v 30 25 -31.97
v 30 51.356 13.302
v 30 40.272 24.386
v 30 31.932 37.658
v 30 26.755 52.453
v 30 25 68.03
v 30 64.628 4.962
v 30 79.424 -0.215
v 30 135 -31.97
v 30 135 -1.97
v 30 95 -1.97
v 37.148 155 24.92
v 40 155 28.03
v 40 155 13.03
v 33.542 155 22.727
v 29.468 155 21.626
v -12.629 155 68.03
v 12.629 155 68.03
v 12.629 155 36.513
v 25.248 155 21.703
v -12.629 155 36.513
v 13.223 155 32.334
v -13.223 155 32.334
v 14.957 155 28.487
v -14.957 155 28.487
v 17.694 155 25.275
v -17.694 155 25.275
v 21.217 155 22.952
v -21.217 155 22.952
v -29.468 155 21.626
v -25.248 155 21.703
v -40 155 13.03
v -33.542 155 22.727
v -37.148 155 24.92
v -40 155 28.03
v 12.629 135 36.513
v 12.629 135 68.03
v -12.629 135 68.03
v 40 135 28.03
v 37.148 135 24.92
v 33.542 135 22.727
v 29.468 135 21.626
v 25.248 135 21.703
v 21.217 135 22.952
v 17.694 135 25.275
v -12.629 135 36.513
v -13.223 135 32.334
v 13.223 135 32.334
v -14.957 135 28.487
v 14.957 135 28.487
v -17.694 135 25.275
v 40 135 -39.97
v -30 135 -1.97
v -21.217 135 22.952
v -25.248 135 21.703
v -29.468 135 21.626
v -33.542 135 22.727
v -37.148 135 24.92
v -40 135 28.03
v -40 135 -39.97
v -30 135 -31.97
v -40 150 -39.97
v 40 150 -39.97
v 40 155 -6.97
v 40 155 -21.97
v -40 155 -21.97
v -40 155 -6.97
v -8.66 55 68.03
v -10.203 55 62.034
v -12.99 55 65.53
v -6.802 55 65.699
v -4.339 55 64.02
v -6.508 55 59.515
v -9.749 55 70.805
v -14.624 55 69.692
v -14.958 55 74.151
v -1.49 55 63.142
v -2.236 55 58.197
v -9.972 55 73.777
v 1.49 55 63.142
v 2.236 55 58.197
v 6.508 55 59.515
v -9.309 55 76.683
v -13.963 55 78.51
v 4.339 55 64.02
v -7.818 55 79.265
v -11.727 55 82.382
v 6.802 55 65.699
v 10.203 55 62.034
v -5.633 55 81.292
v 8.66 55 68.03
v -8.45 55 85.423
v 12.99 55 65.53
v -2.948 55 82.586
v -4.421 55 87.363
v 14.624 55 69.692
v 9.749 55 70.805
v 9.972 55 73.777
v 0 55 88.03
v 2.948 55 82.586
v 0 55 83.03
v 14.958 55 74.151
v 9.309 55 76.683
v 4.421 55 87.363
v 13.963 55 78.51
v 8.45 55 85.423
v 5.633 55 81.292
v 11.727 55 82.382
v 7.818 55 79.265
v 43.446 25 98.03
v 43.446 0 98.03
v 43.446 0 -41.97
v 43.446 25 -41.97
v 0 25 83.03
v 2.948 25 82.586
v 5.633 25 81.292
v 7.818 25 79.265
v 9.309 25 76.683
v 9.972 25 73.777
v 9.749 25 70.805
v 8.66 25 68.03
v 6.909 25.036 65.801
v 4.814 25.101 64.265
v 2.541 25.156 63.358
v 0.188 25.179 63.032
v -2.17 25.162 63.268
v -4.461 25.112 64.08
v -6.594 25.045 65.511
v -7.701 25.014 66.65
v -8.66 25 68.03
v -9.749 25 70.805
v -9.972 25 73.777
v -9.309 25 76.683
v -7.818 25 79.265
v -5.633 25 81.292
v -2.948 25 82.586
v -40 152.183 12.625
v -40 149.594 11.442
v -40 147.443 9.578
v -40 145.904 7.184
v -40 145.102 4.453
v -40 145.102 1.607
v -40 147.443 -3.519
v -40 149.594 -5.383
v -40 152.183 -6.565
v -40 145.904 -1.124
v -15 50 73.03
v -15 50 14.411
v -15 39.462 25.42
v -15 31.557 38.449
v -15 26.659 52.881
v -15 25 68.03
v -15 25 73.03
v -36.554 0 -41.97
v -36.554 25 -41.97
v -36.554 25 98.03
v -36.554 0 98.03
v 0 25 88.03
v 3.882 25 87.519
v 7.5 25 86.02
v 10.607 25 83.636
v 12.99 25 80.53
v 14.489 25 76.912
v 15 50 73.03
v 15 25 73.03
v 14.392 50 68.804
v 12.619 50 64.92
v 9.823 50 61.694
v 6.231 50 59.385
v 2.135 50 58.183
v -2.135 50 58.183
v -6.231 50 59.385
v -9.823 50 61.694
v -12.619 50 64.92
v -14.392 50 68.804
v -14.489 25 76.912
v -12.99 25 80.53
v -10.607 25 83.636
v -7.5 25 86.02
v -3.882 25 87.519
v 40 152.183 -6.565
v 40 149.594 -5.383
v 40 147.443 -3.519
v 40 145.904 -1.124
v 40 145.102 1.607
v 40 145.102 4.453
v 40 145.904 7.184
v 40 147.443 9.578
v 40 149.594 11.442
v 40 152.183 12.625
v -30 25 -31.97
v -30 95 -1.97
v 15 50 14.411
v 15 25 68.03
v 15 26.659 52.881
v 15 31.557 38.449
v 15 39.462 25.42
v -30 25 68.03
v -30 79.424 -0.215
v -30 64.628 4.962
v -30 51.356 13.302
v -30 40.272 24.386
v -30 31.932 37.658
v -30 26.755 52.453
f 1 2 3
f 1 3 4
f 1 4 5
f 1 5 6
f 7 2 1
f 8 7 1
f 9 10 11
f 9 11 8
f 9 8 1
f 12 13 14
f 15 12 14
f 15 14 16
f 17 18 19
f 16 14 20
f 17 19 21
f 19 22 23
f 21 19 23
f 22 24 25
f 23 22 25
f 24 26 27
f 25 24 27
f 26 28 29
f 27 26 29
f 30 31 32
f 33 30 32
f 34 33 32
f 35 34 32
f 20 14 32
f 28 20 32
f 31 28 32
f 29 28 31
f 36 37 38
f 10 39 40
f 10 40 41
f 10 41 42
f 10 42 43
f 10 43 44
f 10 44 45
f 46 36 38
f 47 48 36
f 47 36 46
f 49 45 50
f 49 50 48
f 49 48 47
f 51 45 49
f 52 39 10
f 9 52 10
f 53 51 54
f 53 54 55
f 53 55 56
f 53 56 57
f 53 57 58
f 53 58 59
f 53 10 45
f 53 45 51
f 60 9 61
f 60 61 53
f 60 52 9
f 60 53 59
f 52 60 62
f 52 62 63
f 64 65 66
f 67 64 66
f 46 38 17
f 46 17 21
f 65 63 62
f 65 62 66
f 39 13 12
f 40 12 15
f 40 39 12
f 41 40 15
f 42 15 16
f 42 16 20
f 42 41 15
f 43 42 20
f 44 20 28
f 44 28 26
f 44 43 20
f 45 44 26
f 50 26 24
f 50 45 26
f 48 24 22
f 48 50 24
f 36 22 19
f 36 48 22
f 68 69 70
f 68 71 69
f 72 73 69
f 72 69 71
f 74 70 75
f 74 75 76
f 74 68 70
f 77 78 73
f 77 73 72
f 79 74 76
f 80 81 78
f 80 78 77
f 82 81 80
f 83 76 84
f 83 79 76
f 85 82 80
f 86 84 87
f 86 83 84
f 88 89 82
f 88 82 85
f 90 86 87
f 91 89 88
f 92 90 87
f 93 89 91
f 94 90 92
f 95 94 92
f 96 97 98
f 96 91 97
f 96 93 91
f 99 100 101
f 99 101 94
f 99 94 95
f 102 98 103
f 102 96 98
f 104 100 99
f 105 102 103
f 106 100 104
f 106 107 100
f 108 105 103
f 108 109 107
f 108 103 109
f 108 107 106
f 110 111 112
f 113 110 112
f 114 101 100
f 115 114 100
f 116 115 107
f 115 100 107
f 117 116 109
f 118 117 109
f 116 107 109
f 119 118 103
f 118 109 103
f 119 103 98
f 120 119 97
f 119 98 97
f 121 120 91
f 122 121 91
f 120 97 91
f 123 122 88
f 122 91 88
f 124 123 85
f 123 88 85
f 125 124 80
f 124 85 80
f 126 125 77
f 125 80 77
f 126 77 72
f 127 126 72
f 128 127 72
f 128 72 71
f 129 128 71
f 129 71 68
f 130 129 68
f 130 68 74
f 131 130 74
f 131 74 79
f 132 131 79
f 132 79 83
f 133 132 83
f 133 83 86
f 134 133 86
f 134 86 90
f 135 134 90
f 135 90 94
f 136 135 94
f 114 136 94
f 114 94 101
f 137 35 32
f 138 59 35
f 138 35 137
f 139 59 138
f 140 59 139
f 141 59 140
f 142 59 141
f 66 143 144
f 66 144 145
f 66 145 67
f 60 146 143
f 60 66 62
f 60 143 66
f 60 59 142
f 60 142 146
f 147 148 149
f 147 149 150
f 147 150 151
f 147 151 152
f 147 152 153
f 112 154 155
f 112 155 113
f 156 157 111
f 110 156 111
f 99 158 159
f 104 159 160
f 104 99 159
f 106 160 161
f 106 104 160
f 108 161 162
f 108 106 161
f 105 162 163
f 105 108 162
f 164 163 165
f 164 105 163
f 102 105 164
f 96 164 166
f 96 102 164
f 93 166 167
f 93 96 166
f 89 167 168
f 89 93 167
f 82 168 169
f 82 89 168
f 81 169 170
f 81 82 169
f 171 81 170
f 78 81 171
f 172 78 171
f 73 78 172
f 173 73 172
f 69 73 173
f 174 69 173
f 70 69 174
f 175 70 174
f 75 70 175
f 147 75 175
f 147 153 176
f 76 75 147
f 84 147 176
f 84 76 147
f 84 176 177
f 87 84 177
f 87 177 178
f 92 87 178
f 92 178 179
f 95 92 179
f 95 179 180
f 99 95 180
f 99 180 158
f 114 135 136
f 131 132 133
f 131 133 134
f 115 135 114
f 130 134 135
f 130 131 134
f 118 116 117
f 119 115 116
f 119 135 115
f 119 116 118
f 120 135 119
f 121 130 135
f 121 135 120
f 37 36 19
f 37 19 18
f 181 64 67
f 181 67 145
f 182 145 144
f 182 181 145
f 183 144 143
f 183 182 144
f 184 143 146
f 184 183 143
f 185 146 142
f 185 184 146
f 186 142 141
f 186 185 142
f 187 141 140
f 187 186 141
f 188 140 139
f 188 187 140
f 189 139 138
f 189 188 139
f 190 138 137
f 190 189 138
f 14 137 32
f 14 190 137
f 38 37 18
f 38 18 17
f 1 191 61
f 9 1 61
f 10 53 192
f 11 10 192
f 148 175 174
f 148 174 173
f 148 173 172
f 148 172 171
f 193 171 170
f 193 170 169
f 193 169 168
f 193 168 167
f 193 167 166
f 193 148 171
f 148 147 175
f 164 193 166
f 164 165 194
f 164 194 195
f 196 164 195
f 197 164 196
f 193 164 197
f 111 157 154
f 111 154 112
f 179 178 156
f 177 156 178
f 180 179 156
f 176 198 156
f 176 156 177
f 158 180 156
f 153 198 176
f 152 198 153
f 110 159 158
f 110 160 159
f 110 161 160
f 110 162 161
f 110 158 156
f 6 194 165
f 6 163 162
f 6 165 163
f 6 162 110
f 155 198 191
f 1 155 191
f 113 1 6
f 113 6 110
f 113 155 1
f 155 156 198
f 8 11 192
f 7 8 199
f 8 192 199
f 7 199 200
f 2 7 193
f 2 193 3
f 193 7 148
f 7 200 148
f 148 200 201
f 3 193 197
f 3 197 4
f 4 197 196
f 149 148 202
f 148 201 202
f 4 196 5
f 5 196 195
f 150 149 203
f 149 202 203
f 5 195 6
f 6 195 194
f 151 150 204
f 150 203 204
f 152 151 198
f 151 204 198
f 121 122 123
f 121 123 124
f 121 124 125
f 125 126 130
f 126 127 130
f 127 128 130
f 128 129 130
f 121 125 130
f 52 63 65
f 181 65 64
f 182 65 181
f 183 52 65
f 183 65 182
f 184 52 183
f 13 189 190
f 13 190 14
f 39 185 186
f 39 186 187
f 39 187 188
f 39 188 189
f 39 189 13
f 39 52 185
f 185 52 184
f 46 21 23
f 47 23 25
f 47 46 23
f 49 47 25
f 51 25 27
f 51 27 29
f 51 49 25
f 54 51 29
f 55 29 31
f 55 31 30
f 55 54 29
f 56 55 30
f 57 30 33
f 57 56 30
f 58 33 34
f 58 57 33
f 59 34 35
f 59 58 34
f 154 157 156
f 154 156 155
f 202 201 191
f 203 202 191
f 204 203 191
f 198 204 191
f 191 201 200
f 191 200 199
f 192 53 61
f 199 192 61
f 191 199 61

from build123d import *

# Parameters (mm, degrees)
SKETCH1_W                = 80
SKETCH1_H                = 140
BOSS_EXTRUDE1_DEPTH      = 25
BOSS_EXTRUDE2_DEPTH      = 30
BOSS_EXTRUDE2_DEPTH_BACK = 30
BOSS_EXTRUDE3_REACH      = 135.781
SKETCH3_R                = 15
SKETCH3_R_2              = 10
BOSS_EXTRUDE7_DEPTH      = 30
BOSS_EXTRUDE8_DEPTH      = 20
CUT_EXTRUDE1_REACH       = 202.087


with BuildPart() as part:
    # Sketch1 → Boss-Extrude1 (new body)
    with BuildSketch(Plane(origin=(0, 0, 0), x_dir=(1, 0, 0), z_dir=(0, 1, 0))):
        with Locations((3.446067736, -28.029835879)):
            Rectangle(SKETCH1_W, SKETCH1_H)
    extrude(amount=BOSS_EXTRUDE1_DEPTH)

    # Sketch2 → Boss-Extrude2 (add, two sides: drawn at the far end of the back side and taken through both)
    with BuildSketch(Plane(origin=(0, 0, 0), x_dir=(0, 0, -1), z_dir=(1, 0, 0)).offset(-BOSS_EXTRUDE2_DEPTH_BACK)):
        with BuildLine():
            Line((31.970164121, 25), (31.970164121, 135))
            Line((31.970164121, 135), (1.970164121, 135))
            Line((1.970164121, 135), (1.970164121, 95))
            ThreePointArc((1.970164121, 95), (-18.532361196, 45.502525317), (-68.029835879, 25))
            Line((-68.029835879, 25), (31.970164121, 25))
        make_face()
    extrude(amount=BOSS_EXTRUDE2_DEPTH + BOSS_EXTRUDE2_DEPTH_BACK)

    # Sketch3 → Boss-Extrude3 (add, up to next)
    with BuildSketch(Plane(origin=(0, 55, 0), x_dir=(1, 0, 0), z_dir=(0, 1, 0)), mode=Mode.PRIVATE) as boss_extrude3_sk1:
        with Locations(Location((0, -73.029835879, 0), (0, 0, 270))):
            Circle(SKETCH3_R)
        with Locations(Location((0, -73.029835879, 0), (0, 0, 270))):
            Circle(SKETCH3_R_2, mode=Mode.SUBTRACT)
    boss_extrude3_tool1 = extrude(boss_extrude3_sk1.sketch, amount=-BOSS_EXTRUDE3_REACH, mode=Mode.PRIVATE) - part.part
    add(boss_extrude3_tool1.solids().sort_by_distance((0, 55, 58.4541))[0])

    # Sketch4 → Boss-Extrude7 (add)
    with BuildSketch(Plane(origin=(0, 50, 0), x_dir=(1, 0, 0), z_dir=(0, 1, 0))):
        with BuildLine():
            ThreePointArc((-15, -73.029835859), (6e-09, -58.029835879), (15, -73.029835871))
            Line((15, -73.029835871), (15, -7.547322413))
            Line((15, -7.547322413), (-15, -7.547322413))
            Line((-15, -7.547322413), (-15, -73.029835859))
        make_face()
    extrude(amount=-BOSS_EXTRUDE7_DEPTH)

    # Sketch7 → Boss-Extrude8 (add)
    with BuildSketch(Plane(origin=(0, 135, 0), x_dir=(1, 0, 0), z_dir=(0, 1, 0))):
        with BuildLine():
            Line((12.629019998, -36.512692343), (12.629019998, -68.029835879))
            Line((12.629019998, -68.029835879), (-12.629019998, -68.029835879))
            Line((-12.629019998, -68.029835879), (-12.629019998, -36.512692343))
            ThreePointArc((-12.629019998, -36.512692343), (-23.188563942, -22.185014582), (-40, -28.029835879))
            Line((-40, -28.029835879), (-40, 39.970164121))
            Line((-40, 39.970164121), (40, 39.970164121))
            Line((40, 39.970164121), (40, -28.029835879))
            ThreePointArc((40, -28.029835879), (23.188563942, -22.185014582), (12.629019998, -36.512692343))
        make_face()
    extrude(amount=BOSS_EXTRUDE8_DEPTH)

    # Sketch8 → Cut-Extrude1 (cut, up to next)
    with BuildSketch(Plane(origin=(40, 0, 0), x_dir=(0, 0, -1), z_dir=(1, 0, 0)), mode=Mode.PRIVATE) as cut_extrude1_sk1:
        Polygon((21.970164121, 155), (39.970164121, 155), (39.970164121, 150), align=None)
    cut_extrude1_tool1 = extrude(cut_extrude1_sk1.sketch, amount=-CUT_EXTRUDE1_REACH, mode=Mode.PRIVATE) & part.part
    # Sketch8 → Cut-Extrude1 (cut, up to next)
    with BuildSketch(Plane(origin=(40, 0, 0), x_dir=(0, 0, -1), z_dir=(1, 0, 0)), mode=Mode.PRIVATE) as cut_extrude1_sk2:
        with BuildLine():
            Line((-13.029835879, 155), (6.970164121, 155))
            ThreePointArc((6.970164121, 155), (-3.029835879, 145), (-13.029835879, 155))
        make_face()
    cut_extrude1_tool2 = extrude(cut_extrude1_sk2.sketch, amount=-CUT_EXTRUDE1_REACH, mode=Mode.PRIVATE) & part.part
    add(cut_extrude1_tool1.solids().sort_by_distance((40, 153.333333, -33.970164))[0], mode=Mode.SUBTRACT)
    add(cut_extrude1_tool2.solids().sort_by_distance((40, 150.755868, 3.029836))[0], mode=Mode.SUBTRACT)


solid = part.part
